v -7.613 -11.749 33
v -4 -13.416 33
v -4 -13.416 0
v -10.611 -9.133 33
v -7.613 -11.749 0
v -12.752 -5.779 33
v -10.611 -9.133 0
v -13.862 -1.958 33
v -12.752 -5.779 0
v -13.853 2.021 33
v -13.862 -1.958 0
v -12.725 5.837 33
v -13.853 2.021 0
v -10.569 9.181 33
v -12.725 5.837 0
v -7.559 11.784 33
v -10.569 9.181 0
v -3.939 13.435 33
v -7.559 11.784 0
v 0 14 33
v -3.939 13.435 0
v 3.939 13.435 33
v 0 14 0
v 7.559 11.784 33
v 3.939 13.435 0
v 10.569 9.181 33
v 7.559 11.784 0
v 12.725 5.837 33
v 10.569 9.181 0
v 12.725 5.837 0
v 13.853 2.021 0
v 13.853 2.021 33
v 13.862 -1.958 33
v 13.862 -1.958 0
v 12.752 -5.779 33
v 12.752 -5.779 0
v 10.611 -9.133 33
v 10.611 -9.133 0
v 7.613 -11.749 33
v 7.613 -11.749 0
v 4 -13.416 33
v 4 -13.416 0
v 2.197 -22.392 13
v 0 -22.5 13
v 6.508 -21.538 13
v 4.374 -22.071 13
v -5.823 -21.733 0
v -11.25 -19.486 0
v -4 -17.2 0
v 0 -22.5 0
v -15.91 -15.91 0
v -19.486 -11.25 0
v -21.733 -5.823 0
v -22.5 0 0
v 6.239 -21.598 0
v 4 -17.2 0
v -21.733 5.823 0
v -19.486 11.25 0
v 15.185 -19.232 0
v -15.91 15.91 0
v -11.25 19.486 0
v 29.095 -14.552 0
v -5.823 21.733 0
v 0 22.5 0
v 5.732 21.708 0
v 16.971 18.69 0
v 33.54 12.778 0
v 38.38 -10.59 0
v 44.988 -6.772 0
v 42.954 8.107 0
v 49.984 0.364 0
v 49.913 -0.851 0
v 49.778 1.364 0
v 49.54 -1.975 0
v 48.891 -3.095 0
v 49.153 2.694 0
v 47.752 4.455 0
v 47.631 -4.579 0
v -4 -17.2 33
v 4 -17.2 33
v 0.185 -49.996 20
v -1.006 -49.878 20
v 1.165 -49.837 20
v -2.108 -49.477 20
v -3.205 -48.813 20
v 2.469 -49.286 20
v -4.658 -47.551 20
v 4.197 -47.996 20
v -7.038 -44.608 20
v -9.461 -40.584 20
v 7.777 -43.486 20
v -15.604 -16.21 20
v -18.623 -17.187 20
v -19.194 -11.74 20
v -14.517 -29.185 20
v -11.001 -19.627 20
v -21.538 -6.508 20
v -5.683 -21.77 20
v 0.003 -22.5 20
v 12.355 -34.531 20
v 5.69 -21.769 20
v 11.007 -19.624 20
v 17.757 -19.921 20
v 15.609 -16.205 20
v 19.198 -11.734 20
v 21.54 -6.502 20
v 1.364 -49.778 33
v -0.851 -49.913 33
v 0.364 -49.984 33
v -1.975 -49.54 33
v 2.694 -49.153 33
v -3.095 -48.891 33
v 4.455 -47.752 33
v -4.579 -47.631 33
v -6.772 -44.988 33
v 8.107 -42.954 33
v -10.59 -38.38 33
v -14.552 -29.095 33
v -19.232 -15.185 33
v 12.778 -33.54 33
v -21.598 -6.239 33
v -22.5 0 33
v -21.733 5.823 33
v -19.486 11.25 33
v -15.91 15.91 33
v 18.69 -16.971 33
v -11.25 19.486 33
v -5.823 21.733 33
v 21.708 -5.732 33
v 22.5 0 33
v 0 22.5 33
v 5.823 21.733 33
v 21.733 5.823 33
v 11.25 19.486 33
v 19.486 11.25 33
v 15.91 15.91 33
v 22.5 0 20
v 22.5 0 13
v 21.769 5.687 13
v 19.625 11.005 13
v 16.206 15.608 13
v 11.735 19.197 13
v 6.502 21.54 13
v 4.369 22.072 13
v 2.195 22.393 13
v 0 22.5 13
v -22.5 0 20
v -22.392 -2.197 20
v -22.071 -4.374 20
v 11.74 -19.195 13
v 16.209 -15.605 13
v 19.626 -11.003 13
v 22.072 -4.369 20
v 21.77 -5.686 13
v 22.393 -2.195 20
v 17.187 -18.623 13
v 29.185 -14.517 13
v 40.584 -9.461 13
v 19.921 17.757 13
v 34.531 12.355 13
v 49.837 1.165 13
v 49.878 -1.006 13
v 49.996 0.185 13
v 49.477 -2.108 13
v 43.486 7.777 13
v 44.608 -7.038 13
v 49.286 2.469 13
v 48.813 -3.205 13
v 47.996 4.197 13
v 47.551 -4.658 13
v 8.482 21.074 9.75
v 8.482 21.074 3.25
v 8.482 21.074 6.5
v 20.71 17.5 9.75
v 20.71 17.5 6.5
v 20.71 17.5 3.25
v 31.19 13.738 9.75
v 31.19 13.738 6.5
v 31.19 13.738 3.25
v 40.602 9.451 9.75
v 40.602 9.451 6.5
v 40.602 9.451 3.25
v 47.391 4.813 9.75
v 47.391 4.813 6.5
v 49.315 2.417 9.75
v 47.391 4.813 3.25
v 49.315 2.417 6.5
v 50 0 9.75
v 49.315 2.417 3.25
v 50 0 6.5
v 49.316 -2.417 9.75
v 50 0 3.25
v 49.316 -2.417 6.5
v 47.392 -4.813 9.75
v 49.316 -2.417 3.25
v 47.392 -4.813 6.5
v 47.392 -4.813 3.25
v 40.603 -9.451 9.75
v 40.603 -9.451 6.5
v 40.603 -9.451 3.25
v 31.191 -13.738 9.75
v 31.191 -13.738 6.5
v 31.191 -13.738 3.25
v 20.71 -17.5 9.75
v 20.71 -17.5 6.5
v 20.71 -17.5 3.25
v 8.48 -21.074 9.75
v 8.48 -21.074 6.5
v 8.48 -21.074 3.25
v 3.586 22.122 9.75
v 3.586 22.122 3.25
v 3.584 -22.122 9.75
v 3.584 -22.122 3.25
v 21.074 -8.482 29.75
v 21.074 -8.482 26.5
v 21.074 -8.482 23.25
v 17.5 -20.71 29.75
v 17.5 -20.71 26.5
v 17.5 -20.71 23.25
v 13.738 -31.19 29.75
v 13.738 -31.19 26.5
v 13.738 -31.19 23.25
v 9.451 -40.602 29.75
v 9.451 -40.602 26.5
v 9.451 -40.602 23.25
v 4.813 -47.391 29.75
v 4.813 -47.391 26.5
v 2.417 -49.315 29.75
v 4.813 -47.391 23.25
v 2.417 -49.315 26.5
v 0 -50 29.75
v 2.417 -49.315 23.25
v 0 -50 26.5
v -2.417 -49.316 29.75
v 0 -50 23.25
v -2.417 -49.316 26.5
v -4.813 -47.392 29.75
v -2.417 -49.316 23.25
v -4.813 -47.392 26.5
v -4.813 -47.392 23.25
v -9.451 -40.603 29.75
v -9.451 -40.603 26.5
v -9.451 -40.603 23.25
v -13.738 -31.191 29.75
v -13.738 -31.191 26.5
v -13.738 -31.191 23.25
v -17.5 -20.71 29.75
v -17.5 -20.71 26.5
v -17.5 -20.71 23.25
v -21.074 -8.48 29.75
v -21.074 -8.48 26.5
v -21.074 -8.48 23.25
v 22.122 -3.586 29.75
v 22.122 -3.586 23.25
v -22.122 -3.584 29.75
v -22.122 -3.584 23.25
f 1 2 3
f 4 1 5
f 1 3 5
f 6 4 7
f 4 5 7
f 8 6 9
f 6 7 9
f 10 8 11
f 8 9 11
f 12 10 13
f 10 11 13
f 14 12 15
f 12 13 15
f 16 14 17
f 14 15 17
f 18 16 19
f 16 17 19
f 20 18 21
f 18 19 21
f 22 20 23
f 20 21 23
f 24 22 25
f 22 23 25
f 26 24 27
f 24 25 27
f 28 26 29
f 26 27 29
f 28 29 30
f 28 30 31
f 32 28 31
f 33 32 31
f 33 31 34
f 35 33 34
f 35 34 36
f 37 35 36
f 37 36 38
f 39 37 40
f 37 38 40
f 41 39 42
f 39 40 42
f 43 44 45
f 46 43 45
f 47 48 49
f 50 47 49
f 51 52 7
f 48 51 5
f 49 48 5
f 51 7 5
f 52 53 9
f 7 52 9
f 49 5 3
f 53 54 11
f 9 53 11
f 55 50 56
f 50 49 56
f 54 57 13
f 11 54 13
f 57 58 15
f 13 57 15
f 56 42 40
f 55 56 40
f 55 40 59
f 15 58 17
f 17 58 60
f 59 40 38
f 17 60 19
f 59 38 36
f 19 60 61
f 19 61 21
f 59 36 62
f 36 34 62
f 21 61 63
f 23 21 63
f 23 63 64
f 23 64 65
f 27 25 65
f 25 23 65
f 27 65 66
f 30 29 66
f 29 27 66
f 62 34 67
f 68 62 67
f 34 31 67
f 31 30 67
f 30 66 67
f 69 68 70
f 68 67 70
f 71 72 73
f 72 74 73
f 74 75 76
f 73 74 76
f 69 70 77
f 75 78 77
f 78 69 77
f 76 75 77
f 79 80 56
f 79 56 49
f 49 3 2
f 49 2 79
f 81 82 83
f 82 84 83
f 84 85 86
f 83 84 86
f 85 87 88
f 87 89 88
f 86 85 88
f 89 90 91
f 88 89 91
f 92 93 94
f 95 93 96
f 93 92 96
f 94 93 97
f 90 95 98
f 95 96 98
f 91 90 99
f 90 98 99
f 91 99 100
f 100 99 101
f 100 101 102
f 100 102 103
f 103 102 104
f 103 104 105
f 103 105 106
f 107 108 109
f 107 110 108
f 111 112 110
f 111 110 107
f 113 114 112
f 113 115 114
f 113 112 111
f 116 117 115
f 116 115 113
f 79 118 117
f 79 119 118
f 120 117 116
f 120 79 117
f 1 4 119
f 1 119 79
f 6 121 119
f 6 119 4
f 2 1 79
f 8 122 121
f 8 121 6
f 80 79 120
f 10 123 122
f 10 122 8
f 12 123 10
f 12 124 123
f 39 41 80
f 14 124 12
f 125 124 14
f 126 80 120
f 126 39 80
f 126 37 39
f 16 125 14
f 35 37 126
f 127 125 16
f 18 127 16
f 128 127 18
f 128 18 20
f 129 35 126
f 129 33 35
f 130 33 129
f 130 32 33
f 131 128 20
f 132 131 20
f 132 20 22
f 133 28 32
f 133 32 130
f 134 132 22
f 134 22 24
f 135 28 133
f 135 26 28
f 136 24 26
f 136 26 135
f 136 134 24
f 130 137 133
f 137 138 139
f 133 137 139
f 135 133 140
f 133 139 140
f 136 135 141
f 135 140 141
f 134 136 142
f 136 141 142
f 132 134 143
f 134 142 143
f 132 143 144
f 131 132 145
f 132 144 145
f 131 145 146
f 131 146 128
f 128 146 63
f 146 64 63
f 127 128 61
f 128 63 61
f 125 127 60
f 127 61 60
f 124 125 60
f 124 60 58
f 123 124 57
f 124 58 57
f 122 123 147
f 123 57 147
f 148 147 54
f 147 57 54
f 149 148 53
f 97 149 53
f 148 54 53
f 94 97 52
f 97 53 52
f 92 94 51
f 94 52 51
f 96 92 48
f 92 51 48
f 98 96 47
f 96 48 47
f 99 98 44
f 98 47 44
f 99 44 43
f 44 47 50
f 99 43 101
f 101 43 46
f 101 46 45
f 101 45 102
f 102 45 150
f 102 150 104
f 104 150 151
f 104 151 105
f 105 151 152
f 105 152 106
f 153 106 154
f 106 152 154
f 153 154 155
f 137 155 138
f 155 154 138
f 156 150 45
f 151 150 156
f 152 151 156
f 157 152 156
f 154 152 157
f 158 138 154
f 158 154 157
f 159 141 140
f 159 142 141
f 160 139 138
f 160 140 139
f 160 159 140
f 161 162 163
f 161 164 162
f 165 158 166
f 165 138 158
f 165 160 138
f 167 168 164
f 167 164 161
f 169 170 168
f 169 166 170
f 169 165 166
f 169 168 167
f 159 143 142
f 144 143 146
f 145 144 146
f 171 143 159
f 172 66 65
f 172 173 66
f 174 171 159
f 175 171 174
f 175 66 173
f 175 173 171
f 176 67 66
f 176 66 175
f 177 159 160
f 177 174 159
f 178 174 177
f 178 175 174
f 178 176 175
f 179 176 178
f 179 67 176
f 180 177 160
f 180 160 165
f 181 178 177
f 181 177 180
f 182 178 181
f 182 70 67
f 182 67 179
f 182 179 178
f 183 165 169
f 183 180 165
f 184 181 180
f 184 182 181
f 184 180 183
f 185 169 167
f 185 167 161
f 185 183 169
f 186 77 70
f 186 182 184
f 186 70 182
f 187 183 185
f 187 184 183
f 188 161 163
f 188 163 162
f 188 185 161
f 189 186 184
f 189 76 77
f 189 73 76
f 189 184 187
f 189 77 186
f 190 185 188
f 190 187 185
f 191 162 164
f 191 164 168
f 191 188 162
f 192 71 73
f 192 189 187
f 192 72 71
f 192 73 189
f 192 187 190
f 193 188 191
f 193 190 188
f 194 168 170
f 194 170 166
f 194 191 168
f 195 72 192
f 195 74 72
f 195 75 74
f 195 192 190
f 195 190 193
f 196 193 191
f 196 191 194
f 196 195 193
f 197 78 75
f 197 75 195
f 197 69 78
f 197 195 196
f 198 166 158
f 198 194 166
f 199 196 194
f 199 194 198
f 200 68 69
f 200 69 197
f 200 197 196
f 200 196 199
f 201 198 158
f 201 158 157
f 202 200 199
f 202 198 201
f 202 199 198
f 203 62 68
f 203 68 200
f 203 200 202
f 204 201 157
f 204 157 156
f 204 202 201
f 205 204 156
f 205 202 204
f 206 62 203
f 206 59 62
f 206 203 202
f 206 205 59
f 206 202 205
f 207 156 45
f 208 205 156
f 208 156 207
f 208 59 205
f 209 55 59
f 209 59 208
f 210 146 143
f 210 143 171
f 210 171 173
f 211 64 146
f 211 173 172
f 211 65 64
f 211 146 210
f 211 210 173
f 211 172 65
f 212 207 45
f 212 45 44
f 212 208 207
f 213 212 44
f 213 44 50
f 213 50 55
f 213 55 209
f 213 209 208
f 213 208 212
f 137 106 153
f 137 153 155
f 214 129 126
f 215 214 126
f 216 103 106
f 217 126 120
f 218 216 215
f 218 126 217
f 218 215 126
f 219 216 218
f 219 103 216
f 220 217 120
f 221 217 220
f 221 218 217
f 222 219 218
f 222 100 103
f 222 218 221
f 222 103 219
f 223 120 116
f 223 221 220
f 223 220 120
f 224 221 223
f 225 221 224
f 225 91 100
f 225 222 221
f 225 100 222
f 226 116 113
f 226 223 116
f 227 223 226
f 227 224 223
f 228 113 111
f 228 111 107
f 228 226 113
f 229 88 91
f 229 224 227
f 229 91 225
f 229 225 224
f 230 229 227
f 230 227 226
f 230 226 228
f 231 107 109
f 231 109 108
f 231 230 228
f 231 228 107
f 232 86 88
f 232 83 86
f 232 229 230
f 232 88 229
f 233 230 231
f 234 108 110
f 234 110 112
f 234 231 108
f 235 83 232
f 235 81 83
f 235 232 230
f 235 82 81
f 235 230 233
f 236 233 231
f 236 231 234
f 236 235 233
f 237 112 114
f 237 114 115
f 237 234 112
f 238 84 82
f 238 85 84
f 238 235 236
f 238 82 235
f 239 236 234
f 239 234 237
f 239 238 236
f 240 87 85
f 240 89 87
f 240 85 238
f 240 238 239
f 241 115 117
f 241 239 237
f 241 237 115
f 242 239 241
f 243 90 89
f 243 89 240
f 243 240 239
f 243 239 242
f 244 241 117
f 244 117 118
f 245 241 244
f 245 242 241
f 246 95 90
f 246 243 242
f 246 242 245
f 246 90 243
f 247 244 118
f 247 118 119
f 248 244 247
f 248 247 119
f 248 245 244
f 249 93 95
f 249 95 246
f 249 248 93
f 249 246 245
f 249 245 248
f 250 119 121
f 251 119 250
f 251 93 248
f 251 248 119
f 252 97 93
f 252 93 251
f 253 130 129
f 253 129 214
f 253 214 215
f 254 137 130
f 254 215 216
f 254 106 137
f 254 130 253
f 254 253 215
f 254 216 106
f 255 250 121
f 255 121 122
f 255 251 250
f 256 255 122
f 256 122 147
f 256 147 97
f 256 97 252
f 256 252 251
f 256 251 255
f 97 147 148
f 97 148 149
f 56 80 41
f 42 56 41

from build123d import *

# Parameters (mm, degrees)
SKETCH_1_R          = 14
EXTRUDE_1_DEPTH     = 13
SKETCH_2_R          = 22.5
EXTRUDE_2_DEPTH     = 7
EXTRUDE_3_DEPTH     = 13
SKETCH_4_R          = 14
CUT_EXTRUDE_1_DEPTH = 40
CUT_EXTRUDE_2_DEPTH = 41


with BuildPart() as part:
    # 草图1 → 凸台-拉伸1 (new body)
    with BuildSketch(Plane.XY):
        with BuildLine():
            ThreePointArc((0, 22.5), (-22.5, 0), (0, -22.5))
            add(Edge.make_bspline(
                [(0, 22.5), (3.74256312, 22.5), (25.152008405, 16.944120599), (65.295682957, 0), (25.155025761, -16.944120599), (3.738346709, -22.5), (0, -22.5)],
                knots=[0, 0, 0, 0, 0.192196215, 0.5, 0.807803785, 1, 1, 1, 1], degree=3))
        make_face()
        Circle(SKETCH_1_R, mode=Mode.SUBTRACT)
    extrude(amount=EXTRUDE_1_DEPTH)

    # 草图2 → 凸台-拉伸2 (add)
    with BuildSketch(Plane.XY.offset(13)):
        Circle(SKETCH_2_R)
    extrude(amount=EXTRUDE_2_DEPTH)

    # 草图3 → 凸台-拉伸3 (add)
    with BuildSketch(Plane.XY.offset(20)):
        with BuildLine():
            ThreePointArc((22.5, 0), (0, 22.5), (-22.5, 0))
            add(Edge.make_bspline(
                [(22.5, 0), (22.5, -3.74256312), (16.944120599, -25.152008405), (0, -65.295682957), (-16.944120599, -25.155025761), (-22.5, -3.738346709), (-22.5, 0)],
                knots=[0, 0, 0, 0, 0.192196215, 0.5, 0.807803785, 1, 1, 1, 1], degree=3))
        make_face()
    extrude(amount=EXTRUDE_3_DEPTH)

    # 草图4 → 切除-拉伸1 (cut)
    with BuildSketch(Plane(origin=(0, 0, 13), x_dir=(-1, 0, 0), z_dir=(0, 0, -1))):
        Circle(SKETCH_4_R)
    extrude(amount=-CUT_EXTRUDE_1_DEPTH, mode=Mode.SUBTRACT)

    # 草图5 → 切除-拉伸2 (cut)
    with BuildSketch(Plane.XY.offset(33)):
        Polygon((-4, -14), (-4, -9.153591973), (4, -9.153591973), (4, -14), (4, -17.2), (-4, -17.2), align=None)
    extrude(amount=-CUT_EXTRUDE_2_DEPTH, mode=Mode.SUBTRACT)


solid = part.part
